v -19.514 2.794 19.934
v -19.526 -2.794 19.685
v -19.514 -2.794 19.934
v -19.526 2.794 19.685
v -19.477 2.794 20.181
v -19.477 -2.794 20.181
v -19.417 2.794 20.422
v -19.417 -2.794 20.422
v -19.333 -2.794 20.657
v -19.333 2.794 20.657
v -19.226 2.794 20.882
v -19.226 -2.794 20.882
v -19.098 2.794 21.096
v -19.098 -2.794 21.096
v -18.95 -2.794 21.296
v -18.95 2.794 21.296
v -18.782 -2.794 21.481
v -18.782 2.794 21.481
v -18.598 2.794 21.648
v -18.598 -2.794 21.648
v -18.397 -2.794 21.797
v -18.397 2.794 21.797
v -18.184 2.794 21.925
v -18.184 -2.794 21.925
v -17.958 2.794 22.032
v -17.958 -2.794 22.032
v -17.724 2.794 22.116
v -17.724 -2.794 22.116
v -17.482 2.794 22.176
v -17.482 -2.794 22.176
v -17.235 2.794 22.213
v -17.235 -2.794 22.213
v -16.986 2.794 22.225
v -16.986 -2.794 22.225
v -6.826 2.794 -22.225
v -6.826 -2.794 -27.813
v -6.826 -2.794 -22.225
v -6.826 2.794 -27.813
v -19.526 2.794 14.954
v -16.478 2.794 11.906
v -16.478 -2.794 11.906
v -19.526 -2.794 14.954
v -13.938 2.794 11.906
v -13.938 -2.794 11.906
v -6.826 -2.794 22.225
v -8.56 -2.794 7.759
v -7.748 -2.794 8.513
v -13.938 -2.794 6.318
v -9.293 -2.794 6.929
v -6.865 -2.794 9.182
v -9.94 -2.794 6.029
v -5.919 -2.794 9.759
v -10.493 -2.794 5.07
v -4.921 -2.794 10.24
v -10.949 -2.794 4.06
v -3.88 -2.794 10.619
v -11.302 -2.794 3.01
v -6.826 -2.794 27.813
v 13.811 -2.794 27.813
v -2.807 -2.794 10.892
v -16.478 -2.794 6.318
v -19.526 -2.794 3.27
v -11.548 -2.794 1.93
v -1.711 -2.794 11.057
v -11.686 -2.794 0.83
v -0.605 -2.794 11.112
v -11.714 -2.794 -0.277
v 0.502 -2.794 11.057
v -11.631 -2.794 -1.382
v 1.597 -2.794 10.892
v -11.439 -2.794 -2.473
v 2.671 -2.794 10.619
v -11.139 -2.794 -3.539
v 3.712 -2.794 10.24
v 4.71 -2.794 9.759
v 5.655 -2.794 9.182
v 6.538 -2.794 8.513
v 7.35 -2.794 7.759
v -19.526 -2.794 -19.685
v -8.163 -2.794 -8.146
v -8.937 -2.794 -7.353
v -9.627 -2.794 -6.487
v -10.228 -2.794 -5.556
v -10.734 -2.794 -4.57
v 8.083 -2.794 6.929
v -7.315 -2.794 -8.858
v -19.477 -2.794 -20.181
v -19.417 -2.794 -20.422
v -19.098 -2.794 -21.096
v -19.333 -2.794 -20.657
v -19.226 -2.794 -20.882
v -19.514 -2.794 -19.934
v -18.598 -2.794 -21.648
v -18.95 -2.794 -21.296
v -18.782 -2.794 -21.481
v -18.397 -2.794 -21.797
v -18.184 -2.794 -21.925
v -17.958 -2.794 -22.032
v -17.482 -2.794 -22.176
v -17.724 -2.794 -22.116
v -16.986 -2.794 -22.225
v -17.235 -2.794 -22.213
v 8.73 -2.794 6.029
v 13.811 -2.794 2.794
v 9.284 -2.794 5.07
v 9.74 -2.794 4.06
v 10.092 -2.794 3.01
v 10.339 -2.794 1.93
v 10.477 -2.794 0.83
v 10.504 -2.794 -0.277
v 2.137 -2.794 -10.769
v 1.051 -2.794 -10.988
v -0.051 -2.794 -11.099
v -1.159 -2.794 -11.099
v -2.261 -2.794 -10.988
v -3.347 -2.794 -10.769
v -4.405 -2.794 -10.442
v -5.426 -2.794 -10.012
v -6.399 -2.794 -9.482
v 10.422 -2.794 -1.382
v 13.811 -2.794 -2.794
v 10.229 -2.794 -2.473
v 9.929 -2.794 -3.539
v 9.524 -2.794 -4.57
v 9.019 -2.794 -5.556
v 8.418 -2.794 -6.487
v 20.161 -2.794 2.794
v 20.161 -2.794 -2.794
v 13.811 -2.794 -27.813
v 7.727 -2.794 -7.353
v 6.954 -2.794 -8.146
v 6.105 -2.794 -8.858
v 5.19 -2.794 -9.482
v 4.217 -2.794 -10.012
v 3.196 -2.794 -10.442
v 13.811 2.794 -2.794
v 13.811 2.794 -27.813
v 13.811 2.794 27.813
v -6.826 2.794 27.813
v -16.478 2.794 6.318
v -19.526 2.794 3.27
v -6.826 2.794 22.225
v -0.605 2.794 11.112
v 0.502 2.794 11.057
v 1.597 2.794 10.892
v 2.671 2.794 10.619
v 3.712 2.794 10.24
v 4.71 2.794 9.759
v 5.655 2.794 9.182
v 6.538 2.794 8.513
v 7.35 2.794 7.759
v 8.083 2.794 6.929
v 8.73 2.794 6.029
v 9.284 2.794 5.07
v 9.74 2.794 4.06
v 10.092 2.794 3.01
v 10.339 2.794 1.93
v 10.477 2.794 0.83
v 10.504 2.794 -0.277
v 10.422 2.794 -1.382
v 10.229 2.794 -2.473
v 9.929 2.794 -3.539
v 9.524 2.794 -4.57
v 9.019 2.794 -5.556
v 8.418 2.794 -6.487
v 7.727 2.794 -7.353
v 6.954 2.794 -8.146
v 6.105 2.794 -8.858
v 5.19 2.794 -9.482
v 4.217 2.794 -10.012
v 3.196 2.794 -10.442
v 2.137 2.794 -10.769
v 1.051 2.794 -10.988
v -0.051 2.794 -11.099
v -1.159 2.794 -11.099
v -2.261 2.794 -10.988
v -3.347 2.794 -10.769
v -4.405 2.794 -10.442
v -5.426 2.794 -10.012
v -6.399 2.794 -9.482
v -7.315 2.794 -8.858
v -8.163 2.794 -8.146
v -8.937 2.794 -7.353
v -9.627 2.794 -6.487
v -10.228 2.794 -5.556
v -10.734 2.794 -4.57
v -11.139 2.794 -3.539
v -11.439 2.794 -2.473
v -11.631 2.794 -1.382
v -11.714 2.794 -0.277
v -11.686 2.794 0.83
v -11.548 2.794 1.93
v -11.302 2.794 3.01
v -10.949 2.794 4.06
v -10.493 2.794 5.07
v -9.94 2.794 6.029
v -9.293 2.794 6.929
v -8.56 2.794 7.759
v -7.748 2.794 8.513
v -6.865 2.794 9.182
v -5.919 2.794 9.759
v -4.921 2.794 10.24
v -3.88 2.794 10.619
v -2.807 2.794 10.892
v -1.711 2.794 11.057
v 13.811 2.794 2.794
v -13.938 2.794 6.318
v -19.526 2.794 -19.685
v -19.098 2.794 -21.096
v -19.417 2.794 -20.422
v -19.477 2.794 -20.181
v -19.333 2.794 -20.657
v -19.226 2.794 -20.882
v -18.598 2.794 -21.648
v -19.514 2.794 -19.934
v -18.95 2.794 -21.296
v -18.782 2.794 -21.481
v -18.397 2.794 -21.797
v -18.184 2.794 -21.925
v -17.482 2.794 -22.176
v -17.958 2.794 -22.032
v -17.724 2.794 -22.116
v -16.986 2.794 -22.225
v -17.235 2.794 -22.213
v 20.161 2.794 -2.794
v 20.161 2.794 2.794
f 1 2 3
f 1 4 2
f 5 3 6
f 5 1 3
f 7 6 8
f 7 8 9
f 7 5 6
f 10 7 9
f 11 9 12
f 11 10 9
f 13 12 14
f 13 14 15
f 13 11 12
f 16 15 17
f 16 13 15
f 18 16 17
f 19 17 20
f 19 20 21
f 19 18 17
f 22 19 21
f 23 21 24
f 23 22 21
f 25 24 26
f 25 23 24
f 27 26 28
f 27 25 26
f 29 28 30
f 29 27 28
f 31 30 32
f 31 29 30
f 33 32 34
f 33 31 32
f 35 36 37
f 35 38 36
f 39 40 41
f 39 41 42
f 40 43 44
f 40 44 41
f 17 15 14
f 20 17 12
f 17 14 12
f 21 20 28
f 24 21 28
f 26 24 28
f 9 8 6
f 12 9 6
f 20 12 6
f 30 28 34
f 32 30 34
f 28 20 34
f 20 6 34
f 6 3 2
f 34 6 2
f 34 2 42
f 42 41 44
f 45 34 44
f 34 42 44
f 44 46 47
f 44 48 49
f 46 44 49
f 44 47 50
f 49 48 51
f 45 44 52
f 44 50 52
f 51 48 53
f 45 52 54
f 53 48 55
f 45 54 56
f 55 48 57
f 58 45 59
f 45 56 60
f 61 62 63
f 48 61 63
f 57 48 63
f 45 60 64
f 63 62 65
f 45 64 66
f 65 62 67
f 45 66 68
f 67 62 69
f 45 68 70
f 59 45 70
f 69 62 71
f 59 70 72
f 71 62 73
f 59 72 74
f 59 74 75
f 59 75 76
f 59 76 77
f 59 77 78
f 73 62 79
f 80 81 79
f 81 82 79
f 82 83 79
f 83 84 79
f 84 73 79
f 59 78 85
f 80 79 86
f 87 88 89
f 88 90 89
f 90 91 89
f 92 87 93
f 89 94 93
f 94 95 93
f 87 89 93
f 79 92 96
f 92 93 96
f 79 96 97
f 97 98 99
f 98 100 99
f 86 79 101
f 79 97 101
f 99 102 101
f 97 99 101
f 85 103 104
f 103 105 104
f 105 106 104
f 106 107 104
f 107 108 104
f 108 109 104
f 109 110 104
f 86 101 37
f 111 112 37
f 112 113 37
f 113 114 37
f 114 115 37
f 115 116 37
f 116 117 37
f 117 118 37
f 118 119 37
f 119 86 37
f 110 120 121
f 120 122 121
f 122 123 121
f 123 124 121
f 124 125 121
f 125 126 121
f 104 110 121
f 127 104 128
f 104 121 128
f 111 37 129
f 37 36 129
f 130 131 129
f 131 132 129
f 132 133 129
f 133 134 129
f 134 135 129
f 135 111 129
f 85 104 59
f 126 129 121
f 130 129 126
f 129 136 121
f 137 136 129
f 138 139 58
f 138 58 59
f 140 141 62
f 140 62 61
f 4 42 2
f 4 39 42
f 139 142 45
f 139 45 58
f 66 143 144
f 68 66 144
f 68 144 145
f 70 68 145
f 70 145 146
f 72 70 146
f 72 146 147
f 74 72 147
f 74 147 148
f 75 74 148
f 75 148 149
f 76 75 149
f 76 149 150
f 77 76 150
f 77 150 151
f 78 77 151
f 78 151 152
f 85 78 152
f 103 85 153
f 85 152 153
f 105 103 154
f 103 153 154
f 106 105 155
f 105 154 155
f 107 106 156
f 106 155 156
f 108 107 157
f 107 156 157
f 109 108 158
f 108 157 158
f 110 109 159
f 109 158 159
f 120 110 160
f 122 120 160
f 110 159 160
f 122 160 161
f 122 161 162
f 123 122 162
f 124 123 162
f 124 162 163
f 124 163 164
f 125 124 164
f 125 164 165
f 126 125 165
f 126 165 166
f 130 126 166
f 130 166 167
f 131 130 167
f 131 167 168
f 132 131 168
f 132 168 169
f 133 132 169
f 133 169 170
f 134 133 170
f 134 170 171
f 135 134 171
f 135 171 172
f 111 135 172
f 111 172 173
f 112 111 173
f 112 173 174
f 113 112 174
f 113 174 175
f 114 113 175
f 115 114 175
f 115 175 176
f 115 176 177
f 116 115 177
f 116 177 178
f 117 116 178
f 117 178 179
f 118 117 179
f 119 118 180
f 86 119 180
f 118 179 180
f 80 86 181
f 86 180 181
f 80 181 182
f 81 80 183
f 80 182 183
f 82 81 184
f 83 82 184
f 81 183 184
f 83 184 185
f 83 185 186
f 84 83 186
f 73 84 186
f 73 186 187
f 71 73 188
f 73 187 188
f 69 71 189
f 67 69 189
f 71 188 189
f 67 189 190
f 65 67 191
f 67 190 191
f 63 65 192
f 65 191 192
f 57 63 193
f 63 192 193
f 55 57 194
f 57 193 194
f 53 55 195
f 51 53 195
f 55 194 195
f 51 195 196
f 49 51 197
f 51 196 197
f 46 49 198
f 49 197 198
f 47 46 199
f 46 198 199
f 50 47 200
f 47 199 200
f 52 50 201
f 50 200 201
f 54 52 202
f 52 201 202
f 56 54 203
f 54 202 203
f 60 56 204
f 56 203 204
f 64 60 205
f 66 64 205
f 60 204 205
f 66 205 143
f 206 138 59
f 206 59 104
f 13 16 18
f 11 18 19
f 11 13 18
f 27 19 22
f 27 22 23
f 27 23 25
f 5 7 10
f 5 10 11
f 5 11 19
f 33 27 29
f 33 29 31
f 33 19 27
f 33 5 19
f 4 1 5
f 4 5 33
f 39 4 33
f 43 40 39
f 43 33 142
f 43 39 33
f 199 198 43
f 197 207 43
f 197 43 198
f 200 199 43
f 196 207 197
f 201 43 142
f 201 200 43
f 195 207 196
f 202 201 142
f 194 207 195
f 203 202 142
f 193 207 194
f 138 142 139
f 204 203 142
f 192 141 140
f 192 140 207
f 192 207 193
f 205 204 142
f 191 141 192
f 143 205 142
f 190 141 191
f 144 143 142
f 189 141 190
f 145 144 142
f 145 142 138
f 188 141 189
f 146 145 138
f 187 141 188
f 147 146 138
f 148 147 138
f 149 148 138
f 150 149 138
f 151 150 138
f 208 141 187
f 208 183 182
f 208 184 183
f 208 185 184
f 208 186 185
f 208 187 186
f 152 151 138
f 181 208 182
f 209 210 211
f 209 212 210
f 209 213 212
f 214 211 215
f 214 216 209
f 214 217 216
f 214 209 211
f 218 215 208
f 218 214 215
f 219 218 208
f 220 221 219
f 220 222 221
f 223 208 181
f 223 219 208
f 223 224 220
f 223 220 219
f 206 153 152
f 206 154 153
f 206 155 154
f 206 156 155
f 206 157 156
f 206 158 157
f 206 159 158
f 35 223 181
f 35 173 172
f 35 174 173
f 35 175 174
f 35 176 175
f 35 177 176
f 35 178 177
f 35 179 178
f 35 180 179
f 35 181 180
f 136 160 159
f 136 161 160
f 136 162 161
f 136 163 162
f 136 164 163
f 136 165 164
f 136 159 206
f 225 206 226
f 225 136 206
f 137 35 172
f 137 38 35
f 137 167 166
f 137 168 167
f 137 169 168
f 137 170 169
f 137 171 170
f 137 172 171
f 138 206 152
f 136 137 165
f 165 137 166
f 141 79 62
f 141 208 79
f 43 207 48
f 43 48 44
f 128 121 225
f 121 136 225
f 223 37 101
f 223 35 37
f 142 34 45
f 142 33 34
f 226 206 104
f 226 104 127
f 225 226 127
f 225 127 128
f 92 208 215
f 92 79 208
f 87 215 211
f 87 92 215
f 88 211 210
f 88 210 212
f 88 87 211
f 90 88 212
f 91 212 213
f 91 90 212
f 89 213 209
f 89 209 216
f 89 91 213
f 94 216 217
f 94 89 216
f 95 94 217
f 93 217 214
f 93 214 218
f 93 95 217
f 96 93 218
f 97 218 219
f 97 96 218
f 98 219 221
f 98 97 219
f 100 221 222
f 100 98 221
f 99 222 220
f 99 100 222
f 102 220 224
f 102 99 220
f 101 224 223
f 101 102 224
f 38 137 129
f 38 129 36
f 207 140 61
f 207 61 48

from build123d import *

# Parameters (mm, degrees)
BOSS_EXTRUDE1_DEPTH = 2.794
SKETCH2_W           = 6.35
SKETCH2_H           = 5.588
BOSS_EXTRUDE2_DEPTH = 2.794
SKETCH4_R           = 11.1125
CUT_EXTRUDE2_DEPTH  = 35.803228508
FILLET1_R           = 2.54


with BuildPart() as part:
    # Sketch1 → Boss-Extrude1 (new, symmetric)
    with BuildSketch(Plane(origin=(0, 0, 0), x_dir=(1, 0, 0), z_dir=(0, 1, 0))):
        Polygon((-13.81125, 22.225), (-19.52625, 22.225), (-19.52625, -3.27025), (-16.47825, -6.31825), (-13.93825, -6.31825), (-13.93825, -11.90625), (-16.47825, -11.90625), (-19.52625, -14.95425), (-19.52625, -22.225), (-13.81125, -22.225), (-6.82625, -22.225), (-6.82625, -27.813), (13.81125, -27.813), (13.81125, -22.225), (13.81125, 22.225), (13.81125, 27.813), (-6.82625, 27.813), (-6.82625, 22.225), align=None)
    extrude(amount=BOSS_EXTRUDE1_DEPTH, both=True)

    # Sketch2 → Boss-Extrude2 (add, symmetric)
    with BuildSketch(Plane(origin=(0, 0, 0), x_dir=(1, 0, 0), z_dir=(0, 1, 0))):
        with Locations((16.98625, 0)):
            Rectangle(SKETCH2_W, SKETCH2_H)
    extrude(amount=BOSS_EXTRUDE2_DEPTH, both=True)

    # Sketch4 → Cut-Extrude2 (cut, through all)
    with BuildSketch(Plane(origin=(0, 2.794, 0), x_dir=(1, 0, 0), z_dir=(0, 1, 0))):
        with Locations(Location((-0.604747552, 0, 0), (0, 0, 270))):
            Circle(SKETCH4_R)
    extrude(amount=-CUT_EXTRUDE2_DEPTH, mode=Mode.SUBTRACT)

    # Fillet1
    fillet1_edges = [part.edges().sort_by_distance(p)[0] for p in [
        (-19.52625, 0, 22.225),
        (-19.52625, 0, -22.225),
    ]]
    fillet(fillet1_edges, radius=FILLET1_R)


solid = part.part
